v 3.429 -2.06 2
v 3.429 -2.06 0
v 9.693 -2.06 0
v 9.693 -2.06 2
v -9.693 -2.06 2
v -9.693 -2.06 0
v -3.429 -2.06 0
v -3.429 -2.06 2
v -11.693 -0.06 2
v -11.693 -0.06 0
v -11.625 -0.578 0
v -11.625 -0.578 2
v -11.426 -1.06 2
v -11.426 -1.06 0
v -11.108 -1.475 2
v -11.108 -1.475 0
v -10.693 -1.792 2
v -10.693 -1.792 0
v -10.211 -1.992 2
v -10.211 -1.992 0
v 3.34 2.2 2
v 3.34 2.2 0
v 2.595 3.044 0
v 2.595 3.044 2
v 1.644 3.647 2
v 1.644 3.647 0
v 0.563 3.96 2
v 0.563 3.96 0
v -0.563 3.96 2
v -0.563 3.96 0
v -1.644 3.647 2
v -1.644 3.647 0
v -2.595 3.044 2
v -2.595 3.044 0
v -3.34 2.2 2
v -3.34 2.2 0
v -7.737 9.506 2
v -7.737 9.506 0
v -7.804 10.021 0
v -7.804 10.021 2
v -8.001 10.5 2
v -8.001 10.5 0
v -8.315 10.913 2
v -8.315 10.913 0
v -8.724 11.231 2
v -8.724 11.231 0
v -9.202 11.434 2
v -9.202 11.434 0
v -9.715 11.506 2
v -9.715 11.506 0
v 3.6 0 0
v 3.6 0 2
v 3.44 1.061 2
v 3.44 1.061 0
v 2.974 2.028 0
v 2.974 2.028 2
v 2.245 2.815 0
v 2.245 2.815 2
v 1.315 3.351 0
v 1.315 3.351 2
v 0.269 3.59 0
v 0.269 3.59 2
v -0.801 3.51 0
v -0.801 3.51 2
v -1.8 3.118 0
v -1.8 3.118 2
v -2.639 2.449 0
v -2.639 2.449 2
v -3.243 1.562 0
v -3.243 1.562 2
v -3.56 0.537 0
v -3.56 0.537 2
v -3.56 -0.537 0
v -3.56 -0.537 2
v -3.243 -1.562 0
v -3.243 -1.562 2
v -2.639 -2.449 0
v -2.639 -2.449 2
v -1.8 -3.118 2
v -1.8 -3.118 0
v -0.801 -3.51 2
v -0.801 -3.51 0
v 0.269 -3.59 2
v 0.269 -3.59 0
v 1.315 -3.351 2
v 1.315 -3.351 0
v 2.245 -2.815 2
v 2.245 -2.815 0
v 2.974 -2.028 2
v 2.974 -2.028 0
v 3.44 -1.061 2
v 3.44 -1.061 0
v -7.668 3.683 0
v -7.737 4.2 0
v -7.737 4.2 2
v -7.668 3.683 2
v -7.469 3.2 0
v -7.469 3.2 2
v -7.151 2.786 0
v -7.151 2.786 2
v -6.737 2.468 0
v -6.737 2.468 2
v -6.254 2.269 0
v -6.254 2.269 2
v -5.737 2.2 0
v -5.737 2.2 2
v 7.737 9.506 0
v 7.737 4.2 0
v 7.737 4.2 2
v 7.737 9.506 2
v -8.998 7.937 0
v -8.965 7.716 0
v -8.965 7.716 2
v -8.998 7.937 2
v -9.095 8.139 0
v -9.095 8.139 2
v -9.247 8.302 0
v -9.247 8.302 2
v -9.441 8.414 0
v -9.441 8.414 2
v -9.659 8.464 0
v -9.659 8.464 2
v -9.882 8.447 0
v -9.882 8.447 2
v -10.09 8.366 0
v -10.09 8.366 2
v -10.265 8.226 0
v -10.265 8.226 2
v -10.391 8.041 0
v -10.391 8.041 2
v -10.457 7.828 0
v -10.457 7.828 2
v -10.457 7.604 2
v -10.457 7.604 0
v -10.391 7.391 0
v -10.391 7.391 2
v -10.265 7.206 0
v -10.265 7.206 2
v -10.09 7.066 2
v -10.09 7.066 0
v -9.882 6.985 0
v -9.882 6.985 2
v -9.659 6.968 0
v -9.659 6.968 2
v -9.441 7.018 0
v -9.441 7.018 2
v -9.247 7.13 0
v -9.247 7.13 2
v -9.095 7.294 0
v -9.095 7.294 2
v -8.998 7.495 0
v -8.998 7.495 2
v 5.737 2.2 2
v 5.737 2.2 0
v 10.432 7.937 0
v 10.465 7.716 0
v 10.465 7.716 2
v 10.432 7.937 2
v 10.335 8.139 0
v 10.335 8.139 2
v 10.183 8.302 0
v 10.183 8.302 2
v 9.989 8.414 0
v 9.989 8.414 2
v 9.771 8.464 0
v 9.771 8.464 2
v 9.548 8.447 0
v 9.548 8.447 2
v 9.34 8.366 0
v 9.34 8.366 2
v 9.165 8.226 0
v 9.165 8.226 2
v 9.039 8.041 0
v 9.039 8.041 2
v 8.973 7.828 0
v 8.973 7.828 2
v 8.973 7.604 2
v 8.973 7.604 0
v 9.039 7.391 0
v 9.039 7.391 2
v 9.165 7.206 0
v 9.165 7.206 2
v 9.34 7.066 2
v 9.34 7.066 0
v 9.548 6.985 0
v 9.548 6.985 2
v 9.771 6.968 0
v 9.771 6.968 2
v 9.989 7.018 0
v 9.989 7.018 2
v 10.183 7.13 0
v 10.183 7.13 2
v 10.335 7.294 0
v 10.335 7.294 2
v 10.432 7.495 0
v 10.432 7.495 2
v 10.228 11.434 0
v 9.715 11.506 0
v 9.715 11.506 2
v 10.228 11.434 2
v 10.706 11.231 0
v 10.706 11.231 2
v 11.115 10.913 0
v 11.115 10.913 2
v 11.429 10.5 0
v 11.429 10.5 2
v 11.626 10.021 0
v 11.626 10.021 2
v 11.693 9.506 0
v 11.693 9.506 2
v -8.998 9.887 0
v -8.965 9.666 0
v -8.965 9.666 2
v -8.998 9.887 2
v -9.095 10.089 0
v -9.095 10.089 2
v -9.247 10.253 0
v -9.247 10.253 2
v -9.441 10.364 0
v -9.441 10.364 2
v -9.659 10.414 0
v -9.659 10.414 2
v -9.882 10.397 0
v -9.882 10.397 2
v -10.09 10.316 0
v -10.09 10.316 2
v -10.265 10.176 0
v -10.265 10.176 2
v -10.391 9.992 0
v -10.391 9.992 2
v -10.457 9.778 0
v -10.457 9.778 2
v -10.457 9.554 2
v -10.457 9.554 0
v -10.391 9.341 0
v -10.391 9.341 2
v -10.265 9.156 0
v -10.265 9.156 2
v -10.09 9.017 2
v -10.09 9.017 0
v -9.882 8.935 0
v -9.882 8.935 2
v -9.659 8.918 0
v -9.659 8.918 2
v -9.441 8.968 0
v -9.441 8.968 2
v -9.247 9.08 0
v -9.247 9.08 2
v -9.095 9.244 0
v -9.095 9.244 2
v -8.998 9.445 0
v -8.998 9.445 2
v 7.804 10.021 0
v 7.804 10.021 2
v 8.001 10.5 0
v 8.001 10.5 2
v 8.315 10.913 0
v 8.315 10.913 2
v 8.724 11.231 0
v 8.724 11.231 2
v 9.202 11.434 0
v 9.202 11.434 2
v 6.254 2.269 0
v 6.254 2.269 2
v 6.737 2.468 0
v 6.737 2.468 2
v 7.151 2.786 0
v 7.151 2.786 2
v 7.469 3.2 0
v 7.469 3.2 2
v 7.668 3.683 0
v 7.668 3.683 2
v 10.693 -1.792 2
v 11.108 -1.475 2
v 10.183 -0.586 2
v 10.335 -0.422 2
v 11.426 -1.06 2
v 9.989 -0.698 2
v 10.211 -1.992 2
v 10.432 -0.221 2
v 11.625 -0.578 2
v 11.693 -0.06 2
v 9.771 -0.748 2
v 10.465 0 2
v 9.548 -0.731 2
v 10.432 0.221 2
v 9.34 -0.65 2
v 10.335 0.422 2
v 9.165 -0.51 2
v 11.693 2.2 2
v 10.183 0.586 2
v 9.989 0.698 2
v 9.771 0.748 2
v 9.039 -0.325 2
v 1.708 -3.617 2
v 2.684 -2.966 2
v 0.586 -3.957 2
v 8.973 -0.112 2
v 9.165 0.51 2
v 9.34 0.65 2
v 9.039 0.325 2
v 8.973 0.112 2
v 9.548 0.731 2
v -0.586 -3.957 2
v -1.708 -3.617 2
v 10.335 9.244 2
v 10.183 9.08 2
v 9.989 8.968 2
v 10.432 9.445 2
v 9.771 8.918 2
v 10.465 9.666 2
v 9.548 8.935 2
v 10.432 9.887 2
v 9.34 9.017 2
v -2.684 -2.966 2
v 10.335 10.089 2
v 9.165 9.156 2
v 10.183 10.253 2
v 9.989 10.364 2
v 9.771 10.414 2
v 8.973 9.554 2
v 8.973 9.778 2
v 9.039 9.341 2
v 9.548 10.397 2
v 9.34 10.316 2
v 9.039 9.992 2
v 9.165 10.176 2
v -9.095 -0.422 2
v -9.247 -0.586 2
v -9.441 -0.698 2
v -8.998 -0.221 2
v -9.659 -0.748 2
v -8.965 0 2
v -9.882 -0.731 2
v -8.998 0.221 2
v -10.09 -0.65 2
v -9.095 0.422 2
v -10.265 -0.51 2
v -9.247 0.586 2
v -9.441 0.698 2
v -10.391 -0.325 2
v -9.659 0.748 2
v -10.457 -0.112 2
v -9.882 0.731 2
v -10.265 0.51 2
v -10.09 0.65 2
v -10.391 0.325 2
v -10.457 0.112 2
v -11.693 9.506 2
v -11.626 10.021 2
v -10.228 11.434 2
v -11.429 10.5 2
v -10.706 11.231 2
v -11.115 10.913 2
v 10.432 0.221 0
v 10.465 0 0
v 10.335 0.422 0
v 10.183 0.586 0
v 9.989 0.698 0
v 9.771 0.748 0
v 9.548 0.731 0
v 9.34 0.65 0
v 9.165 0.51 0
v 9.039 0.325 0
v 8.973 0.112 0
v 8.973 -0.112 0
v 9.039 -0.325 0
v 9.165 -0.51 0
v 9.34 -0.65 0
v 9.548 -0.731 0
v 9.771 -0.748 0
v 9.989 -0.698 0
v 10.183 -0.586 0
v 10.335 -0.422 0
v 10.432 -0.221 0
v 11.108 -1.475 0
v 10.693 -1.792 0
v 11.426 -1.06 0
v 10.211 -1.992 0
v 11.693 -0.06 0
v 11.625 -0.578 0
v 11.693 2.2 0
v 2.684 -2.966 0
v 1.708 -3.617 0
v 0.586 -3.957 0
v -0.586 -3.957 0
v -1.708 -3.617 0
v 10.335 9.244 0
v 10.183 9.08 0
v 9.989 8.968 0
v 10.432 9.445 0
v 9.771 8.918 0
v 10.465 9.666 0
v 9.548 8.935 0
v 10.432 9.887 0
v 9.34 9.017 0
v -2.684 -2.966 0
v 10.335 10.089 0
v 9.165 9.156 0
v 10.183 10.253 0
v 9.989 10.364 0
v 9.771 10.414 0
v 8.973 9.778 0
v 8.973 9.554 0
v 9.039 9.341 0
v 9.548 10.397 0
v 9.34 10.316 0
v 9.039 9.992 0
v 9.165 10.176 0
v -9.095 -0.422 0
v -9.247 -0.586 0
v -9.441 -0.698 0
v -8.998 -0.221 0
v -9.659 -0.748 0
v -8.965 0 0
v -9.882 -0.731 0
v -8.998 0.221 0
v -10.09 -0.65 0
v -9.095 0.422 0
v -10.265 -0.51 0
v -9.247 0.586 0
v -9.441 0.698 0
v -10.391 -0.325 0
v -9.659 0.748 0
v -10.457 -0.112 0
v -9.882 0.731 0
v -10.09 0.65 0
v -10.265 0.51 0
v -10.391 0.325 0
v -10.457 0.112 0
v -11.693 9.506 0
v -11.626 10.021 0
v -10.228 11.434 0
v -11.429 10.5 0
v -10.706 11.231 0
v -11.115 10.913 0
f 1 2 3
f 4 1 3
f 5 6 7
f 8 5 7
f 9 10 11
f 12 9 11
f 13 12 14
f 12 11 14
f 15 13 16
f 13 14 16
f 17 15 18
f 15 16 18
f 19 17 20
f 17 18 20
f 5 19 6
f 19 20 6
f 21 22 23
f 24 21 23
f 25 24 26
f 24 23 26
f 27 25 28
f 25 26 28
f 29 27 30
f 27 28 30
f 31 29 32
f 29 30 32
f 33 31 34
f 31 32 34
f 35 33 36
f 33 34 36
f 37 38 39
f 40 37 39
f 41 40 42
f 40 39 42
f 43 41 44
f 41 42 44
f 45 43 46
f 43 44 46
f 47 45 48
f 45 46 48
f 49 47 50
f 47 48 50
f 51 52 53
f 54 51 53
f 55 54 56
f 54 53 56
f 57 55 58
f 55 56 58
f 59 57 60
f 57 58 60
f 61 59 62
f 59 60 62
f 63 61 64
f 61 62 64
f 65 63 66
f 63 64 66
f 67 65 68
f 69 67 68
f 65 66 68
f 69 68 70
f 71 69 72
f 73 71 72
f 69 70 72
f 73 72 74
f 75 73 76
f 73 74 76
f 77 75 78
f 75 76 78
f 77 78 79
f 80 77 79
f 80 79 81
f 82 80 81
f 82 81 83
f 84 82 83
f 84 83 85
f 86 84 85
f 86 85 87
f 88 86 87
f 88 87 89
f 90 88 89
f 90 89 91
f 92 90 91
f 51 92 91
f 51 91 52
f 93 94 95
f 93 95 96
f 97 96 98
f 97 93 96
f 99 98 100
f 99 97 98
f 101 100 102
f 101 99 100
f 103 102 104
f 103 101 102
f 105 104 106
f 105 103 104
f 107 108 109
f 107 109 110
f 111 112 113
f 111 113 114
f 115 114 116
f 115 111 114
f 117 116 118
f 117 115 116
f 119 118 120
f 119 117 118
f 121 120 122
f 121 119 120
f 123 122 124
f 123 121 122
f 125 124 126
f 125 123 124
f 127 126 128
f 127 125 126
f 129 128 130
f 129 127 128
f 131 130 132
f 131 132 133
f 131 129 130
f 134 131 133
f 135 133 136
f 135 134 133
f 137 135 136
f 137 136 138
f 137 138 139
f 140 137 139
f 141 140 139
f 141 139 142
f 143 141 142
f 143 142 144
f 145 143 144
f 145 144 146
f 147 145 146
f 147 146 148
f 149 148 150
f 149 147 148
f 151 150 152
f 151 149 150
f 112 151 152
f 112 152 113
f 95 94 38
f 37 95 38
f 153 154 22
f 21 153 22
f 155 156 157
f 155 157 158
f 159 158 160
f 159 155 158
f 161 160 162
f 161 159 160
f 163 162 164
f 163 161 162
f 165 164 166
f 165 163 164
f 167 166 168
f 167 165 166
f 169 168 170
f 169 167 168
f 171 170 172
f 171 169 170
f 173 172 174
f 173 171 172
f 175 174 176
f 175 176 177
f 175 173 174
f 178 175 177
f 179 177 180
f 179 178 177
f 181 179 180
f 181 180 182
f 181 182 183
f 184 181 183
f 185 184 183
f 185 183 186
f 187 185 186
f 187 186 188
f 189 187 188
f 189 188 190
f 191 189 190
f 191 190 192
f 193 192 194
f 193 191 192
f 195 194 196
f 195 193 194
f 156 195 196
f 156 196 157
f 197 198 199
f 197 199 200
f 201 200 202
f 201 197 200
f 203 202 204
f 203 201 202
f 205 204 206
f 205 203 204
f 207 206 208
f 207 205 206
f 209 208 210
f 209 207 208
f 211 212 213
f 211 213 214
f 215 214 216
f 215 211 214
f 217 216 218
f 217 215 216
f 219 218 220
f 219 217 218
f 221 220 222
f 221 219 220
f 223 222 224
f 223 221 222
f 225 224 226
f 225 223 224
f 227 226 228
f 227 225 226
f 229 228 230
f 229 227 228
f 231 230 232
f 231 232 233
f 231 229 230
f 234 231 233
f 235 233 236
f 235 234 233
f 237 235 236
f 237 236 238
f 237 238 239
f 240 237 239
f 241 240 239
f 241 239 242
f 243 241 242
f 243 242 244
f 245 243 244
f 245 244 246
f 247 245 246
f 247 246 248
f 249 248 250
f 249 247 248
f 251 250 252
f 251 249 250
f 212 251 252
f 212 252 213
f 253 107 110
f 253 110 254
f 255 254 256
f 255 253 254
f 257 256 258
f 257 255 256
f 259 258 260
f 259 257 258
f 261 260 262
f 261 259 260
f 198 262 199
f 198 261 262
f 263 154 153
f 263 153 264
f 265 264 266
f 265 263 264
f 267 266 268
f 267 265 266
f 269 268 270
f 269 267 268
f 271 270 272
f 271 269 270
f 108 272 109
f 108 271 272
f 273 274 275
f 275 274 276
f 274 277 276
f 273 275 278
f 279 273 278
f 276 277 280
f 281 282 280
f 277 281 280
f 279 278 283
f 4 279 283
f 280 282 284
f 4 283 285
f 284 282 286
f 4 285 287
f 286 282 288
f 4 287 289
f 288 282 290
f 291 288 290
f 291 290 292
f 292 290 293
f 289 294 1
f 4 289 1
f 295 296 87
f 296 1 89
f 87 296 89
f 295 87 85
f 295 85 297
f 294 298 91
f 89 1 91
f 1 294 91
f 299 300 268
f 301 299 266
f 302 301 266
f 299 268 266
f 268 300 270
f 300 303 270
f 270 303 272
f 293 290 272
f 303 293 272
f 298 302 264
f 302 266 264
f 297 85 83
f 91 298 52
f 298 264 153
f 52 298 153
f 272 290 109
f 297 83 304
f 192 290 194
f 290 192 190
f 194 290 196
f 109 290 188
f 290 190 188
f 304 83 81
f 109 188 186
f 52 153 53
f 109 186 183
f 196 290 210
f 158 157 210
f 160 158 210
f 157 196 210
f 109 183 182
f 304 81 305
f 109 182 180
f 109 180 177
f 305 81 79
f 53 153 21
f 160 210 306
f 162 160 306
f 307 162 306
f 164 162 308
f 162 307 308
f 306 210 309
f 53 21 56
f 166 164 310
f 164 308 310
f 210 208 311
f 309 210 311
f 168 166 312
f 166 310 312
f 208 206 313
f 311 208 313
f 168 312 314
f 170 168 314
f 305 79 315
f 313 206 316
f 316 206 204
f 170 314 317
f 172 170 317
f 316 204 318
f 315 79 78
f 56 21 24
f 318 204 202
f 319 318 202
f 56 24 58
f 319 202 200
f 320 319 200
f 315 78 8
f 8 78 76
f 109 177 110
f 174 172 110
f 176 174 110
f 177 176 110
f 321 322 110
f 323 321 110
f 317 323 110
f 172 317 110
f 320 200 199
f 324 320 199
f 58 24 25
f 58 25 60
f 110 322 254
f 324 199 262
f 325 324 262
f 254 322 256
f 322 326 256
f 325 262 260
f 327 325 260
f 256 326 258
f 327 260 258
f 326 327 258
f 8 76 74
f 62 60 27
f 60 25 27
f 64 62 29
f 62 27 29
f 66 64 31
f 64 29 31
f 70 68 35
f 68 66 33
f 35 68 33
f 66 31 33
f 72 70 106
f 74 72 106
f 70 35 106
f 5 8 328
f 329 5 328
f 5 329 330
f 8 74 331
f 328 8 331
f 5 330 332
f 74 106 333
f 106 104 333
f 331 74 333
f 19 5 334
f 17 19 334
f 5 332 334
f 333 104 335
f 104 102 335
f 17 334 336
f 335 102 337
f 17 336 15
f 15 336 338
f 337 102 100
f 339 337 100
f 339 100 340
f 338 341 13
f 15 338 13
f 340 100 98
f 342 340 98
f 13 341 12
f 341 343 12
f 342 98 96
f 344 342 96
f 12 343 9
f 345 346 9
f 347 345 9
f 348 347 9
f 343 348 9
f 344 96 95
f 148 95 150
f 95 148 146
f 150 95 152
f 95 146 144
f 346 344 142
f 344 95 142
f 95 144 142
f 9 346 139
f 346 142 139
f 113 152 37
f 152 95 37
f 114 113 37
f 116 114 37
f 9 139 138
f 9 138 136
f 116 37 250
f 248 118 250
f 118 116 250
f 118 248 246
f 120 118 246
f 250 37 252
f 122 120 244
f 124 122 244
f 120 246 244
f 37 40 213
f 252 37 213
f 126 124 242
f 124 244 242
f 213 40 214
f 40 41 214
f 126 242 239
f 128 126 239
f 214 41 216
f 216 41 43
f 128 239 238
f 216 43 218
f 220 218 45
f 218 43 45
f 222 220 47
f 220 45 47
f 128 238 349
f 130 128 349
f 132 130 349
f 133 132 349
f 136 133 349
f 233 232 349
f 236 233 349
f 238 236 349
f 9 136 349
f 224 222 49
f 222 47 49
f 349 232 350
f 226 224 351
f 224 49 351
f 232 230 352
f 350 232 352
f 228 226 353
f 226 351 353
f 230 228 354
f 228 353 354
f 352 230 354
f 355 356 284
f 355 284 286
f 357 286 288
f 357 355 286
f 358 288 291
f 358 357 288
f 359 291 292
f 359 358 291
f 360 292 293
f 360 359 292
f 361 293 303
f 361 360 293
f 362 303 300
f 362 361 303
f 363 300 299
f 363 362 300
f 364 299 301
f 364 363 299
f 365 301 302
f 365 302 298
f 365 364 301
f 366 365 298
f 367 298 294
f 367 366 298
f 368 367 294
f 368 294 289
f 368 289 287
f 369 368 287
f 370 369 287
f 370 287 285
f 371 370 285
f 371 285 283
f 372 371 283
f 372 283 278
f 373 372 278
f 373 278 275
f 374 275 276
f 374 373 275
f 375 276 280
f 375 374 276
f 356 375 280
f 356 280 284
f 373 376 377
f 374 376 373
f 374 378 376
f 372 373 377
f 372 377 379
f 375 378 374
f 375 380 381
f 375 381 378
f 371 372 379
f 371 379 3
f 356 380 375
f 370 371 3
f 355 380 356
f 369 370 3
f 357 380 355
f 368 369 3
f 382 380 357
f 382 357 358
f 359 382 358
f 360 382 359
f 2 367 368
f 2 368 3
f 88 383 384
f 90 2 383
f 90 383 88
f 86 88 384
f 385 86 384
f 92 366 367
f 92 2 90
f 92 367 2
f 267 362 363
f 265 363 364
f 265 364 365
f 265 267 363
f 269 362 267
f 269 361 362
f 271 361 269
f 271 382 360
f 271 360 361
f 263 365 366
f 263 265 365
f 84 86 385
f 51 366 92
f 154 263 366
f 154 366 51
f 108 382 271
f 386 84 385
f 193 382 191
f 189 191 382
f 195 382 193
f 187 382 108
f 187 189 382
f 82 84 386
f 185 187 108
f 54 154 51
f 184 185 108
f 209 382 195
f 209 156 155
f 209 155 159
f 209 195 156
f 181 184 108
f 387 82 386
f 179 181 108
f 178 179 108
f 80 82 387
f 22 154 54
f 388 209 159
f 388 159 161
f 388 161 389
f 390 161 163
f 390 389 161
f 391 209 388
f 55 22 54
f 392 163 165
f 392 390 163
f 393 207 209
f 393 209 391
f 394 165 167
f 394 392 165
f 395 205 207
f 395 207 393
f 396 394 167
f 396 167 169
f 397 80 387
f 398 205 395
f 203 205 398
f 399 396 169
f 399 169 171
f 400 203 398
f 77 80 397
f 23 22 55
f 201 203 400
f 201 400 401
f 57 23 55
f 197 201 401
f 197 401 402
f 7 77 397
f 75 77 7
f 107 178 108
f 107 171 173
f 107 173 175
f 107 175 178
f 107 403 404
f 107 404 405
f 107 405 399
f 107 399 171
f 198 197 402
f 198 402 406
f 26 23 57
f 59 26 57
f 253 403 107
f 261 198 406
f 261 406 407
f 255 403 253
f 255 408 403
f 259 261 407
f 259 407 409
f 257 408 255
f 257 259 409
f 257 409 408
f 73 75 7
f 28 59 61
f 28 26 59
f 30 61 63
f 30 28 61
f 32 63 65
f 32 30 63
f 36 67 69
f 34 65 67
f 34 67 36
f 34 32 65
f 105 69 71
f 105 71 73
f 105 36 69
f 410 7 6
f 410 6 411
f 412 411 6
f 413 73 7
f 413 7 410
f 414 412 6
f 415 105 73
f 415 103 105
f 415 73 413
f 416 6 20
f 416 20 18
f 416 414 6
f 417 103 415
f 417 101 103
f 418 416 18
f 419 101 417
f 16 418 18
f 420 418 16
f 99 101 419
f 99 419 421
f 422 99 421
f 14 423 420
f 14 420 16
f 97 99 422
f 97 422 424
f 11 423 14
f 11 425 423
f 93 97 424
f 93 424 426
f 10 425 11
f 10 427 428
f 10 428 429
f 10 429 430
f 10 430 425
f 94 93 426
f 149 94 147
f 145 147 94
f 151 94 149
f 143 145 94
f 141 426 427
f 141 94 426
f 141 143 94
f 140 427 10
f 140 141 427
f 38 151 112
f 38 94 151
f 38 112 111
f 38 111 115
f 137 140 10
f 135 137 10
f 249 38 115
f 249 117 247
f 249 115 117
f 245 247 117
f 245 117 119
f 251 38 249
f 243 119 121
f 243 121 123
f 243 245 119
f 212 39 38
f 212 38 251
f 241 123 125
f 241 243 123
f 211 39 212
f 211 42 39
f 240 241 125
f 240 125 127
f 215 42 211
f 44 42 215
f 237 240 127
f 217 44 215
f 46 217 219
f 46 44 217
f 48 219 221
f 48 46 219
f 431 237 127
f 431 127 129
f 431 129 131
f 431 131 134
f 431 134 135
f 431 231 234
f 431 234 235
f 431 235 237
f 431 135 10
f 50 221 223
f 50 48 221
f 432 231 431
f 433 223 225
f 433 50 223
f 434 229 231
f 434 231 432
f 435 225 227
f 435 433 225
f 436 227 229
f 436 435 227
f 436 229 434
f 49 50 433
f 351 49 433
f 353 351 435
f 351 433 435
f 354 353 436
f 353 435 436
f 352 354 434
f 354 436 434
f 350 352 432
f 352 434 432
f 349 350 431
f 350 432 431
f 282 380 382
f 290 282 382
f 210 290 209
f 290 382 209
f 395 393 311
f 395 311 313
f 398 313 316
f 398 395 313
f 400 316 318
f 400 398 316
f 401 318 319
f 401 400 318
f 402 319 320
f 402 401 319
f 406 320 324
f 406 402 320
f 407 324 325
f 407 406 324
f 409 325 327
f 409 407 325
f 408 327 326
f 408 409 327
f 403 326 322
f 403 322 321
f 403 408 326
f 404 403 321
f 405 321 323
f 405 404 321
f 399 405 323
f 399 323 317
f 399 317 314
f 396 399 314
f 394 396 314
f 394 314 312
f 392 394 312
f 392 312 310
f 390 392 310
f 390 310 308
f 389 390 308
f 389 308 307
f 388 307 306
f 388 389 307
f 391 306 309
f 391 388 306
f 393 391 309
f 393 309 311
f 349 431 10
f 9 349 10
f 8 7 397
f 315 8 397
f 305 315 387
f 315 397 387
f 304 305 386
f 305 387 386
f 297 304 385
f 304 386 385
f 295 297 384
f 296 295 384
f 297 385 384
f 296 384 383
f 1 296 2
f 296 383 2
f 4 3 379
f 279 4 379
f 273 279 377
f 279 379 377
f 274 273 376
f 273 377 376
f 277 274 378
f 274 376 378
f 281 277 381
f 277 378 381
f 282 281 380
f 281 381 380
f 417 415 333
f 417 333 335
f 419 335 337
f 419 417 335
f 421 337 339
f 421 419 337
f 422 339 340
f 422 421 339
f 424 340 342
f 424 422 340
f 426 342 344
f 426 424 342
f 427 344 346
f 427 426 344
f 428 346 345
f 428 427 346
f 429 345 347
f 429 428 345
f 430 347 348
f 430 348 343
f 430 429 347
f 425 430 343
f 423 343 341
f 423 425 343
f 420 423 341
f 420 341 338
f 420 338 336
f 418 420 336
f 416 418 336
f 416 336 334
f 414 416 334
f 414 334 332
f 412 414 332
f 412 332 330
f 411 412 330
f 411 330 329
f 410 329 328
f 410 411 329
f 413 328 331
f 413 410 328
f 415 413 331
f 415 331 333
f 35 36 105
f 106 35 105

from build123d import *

# Parameters (mm, degrees)
F0_W        = 3.9569679648
F0_H        = 9.3060303107
F0_R        = 0.75
F1_DEPTH    = 2
F2_R        = 3.6
F3_DEPTH    = 25
F4_T1_DEPTH = 2
F4_T3_DEPTH = 12


# Not quite as in the source:
# - a fillet or chamfer that OpenCascade refuses, or shapes differently, is made with other operations: its cross-section is extruded or revolved along the edge and cut away or added


with BuildPart() as f1:
    # F0 (on Top) → F1 (new body)
    with BuildSketch(Plane.XY):
        with Locations((-9.7150150687, 6.8534435891)):
            Rectangle(F0_W, F0_H)
        with Locations((-9.7150150687, 7.7160103247)):
            Circle(F0_R, mode=Mode.SUBTRACT)
        with Locations((-9.7150150687, 9.6662240103)):
            Circle(F0_R, mode=Mode.SUBTRACT)
        with BuildLine():
            ThreePointArc((-3.4285871837, -2.0602887962), (-3.9991430252, 0.0827953119), (-3.3403764321, 2.2004284337))
            Line((-3.3403764321, 2.2004284337), (-7.7365310863, 2.2004284337))
            Line((-7.7365310863, 2.2004284337), (-11.693499051, 2.2004284337))
            Line((-11.693499051, 2.2004284337), (-11.693499051, -2.0602887962))
            Line((-11.693499051, -2.0602887962), (-3.4285871837, -2.0602887962))
        make_face()
        with Locations((-9.7150150687, 0)):
            Circle(F0_R, mode=Mode.SUBTRACT)
        with BuildLine():
            Line((3.3403764321, -2.0602887962), (3.3403764321, 2.2004284337))
            ThreePointArc((3.3403764321, 2.2004284337), (0, 4), (-3.3403764321, 2.2004284337))
            Line((-3.3403764321, 2.2004284337), (-3.3403764321, -2.0602887962))
            Line((-3.3403764321, -2.0602887962), (-3.4285871837, -2.0602887962))
            ThreePointArc((-3.4285871837, -2.0602887962), (0, -4), (3.4285871837, -2.0602887962))
            Line((3.4285871837, -2.0602887962), (3.3403764321, -2.0602887962))
        make_face()
        with BuildLine():
            ThreePointArc((3.3403764321, 2.2004284337), (3.8315470588, 1.1485848405), (4, 0))
            ThreePointArc((4, 0), (3.8545005341, -1.06903023), (3.4285871837, -2.0602887962))
            Line((3.4285871837, -2.0602887962), (11.693499051, -2.0602887962))
            Line((11.693499051, -2.0602887962), (11.693499051, 2.2004284337))
            Line((11.693499051, 2.2004284337), (7.7365310863, 2.2004284337))
            Line((7.7365310863, 2.2004284337), (3.3403764321, 2.2004284337))
        make_face()
        with Locations((9.7150150687, 0)):
            Circle(F0_R, mode=Mode.SUBTRACT)
        with Locations((9.7150150687, 6.8534435891)):
            Rectangle(F0_W, F0_H)
        with Locations((9.7150150687, 7.7160103247)):
            Circle(F0_R, mode=Mode.SUBTRACT)
        with Locations((9.7150150687, 9.6662240103)):
            Circle(F0_R, mode=Mode.SUBTRACT)
        with BuildLine():
            Line((-3.3403764321, -2.0602887962), (-3.3403764321, 2.2004284337))
            ThreePointArc((-3.3403764321, 2.2004284337), (-3.9991430252, 0.0827953119), (-3.4285871837, -2.0602887962))
            Line((-3.4285871837, -2.0602887962), (-3.3403764321, -2.0602887962))
        make_face()
        with BuildLine():
            ThreePointArc((3.4285871837, -2.0602887962), (3.8545005341, -1.06903023), (4, 0))
            ThreePointArc((4, 0), (3.8315470588, 1.1485848405), (3.3403764321, 2.2004284337))
            Line((3.3403764321, 2.2004284337), (3.3403764321, -2.0602887962))
            Line((3.3403764321, -2.0602887962), (3.4285871837, -2.0602887962))
        make_face()
    extrude(amount=F1_DEPTH)

    # F2 (on face) → F3 (cut)
    with BuildSketch(Plane.XY.offset(2)):
        Circle(F2_R)
    extrude(amount=-F3_DEPTH, mode=Mode.SUBTRACT)

    # F4: fillet of radius 2 on 8 edges, made by hand

    # F4_s2 → F4_t1 (join)
    with BuildSketch(Plane.XY):
        with BuildLine():
            ThreePointArc((-7.7365310863, 4.2004284337), (-7.1507446486, 2.7862148714), (-5.7365310863, 2.2004284337))
            Line((-5.7365310863, 2.2004284337), (-7.7365310863, 2.2004284337))
            Line((-7.7365310863, 2.2004284337), (-7.7365310863, 4.2004284337))
        make_face()
        with BuildLine():
            ThreePointArc((5.7365310863, 2.2004284337), (7.1507446486, 2.7862148714), (7.7365310863, 4.2004284337))
            Line((7.7365310863, 4.2004284337), (7.7365310863, 2.2004284337))
            Line((7.7365310863, 2.2004284337), (5.7365310863, 2.2004284337))
        make_face()
    extrude(amount=F4_T1_DEPTH)

    # F4_s4 → F4_t3 (cut)
    with BuildSketch(Plane.XY.offset(-5)):
        with BuildLine():
            ThreePointArc((9.693499051, 11.5064587444), (11.1077126134, 10.9206723068), (11.693499051, 9.5064587444))
            Line((11.693499051, 9.5064587444), (11.693499051, 11.5064587444))
            Line((11.693499051, 11.5064587444), (9.693499051, 11.5064587444))
        make_face()
        with BuildLine():
            ThreePointArc((7.7365310863, 9.5064587444), (8.3223175239, 10.9206723068), (9.7365310863, 11.5064587444))
            Line((9.7365310863, 11.5064587444), (7.7365310863, 11.5064587444))
            Line((7.7365310863, 11.5064587444), (7.7365310863, 9.5064587444))
        make_face()
        with BuildLine():
            ThreePointArc((-7.7365310863, 9.5064587444), (-8.3223175239, 10.9206723068), (-9.7365310863, 11.5064587444))
            Line((-9.7365310863, 11.5064587444), (-7.7365310863, 11.5064587444))
            Line((-7.7365310863, 11.5064587444), (-7.7365310863, 9.5064587444))
        make_face()
        with BuildLine():
            ThreePointArc((-9.693499051, 11.5064587444), (-11.1077126134, 10.9206723068), (-11.693499051, 9.5064587444))
            Line((-11.693499051, 9.5064587444), (-11.693499051, 11.5064587444))
            Line((-11.693499051, 11.5064587444), (-9.693499051, 11.5064587444))
        make_face()
        with BuildLine():
            ThreePointArc((-11.693499051, -0.0602887962), (-11.1077126134, -1.4745023586), (-9.693499051, -2.0602887962))
            Line((-9.693499051, -2.0602887962), (-11.693499051, -2.0602887962))
            Line((-11.693499051, -2.0602887962), (-11.693499051, -0.0602887962))
        make_face()
        with BuildLine():
            ThreePointArc((9.693499051, -2.0602887962), (11.1077126134, -1.4745023586), (11.693499051, -0.0602887962))
            Line((11.693499051, -0.0602887962), (11.693499051, -2.0602887962))
            Line((11.693499051, -2.0602887962), (9.693499051, -2.0602887962))
        make_face()
    extrude(amount=F4_T3_DEPTH, mode=Mode.SUBTRACT)


solid = f1.part
